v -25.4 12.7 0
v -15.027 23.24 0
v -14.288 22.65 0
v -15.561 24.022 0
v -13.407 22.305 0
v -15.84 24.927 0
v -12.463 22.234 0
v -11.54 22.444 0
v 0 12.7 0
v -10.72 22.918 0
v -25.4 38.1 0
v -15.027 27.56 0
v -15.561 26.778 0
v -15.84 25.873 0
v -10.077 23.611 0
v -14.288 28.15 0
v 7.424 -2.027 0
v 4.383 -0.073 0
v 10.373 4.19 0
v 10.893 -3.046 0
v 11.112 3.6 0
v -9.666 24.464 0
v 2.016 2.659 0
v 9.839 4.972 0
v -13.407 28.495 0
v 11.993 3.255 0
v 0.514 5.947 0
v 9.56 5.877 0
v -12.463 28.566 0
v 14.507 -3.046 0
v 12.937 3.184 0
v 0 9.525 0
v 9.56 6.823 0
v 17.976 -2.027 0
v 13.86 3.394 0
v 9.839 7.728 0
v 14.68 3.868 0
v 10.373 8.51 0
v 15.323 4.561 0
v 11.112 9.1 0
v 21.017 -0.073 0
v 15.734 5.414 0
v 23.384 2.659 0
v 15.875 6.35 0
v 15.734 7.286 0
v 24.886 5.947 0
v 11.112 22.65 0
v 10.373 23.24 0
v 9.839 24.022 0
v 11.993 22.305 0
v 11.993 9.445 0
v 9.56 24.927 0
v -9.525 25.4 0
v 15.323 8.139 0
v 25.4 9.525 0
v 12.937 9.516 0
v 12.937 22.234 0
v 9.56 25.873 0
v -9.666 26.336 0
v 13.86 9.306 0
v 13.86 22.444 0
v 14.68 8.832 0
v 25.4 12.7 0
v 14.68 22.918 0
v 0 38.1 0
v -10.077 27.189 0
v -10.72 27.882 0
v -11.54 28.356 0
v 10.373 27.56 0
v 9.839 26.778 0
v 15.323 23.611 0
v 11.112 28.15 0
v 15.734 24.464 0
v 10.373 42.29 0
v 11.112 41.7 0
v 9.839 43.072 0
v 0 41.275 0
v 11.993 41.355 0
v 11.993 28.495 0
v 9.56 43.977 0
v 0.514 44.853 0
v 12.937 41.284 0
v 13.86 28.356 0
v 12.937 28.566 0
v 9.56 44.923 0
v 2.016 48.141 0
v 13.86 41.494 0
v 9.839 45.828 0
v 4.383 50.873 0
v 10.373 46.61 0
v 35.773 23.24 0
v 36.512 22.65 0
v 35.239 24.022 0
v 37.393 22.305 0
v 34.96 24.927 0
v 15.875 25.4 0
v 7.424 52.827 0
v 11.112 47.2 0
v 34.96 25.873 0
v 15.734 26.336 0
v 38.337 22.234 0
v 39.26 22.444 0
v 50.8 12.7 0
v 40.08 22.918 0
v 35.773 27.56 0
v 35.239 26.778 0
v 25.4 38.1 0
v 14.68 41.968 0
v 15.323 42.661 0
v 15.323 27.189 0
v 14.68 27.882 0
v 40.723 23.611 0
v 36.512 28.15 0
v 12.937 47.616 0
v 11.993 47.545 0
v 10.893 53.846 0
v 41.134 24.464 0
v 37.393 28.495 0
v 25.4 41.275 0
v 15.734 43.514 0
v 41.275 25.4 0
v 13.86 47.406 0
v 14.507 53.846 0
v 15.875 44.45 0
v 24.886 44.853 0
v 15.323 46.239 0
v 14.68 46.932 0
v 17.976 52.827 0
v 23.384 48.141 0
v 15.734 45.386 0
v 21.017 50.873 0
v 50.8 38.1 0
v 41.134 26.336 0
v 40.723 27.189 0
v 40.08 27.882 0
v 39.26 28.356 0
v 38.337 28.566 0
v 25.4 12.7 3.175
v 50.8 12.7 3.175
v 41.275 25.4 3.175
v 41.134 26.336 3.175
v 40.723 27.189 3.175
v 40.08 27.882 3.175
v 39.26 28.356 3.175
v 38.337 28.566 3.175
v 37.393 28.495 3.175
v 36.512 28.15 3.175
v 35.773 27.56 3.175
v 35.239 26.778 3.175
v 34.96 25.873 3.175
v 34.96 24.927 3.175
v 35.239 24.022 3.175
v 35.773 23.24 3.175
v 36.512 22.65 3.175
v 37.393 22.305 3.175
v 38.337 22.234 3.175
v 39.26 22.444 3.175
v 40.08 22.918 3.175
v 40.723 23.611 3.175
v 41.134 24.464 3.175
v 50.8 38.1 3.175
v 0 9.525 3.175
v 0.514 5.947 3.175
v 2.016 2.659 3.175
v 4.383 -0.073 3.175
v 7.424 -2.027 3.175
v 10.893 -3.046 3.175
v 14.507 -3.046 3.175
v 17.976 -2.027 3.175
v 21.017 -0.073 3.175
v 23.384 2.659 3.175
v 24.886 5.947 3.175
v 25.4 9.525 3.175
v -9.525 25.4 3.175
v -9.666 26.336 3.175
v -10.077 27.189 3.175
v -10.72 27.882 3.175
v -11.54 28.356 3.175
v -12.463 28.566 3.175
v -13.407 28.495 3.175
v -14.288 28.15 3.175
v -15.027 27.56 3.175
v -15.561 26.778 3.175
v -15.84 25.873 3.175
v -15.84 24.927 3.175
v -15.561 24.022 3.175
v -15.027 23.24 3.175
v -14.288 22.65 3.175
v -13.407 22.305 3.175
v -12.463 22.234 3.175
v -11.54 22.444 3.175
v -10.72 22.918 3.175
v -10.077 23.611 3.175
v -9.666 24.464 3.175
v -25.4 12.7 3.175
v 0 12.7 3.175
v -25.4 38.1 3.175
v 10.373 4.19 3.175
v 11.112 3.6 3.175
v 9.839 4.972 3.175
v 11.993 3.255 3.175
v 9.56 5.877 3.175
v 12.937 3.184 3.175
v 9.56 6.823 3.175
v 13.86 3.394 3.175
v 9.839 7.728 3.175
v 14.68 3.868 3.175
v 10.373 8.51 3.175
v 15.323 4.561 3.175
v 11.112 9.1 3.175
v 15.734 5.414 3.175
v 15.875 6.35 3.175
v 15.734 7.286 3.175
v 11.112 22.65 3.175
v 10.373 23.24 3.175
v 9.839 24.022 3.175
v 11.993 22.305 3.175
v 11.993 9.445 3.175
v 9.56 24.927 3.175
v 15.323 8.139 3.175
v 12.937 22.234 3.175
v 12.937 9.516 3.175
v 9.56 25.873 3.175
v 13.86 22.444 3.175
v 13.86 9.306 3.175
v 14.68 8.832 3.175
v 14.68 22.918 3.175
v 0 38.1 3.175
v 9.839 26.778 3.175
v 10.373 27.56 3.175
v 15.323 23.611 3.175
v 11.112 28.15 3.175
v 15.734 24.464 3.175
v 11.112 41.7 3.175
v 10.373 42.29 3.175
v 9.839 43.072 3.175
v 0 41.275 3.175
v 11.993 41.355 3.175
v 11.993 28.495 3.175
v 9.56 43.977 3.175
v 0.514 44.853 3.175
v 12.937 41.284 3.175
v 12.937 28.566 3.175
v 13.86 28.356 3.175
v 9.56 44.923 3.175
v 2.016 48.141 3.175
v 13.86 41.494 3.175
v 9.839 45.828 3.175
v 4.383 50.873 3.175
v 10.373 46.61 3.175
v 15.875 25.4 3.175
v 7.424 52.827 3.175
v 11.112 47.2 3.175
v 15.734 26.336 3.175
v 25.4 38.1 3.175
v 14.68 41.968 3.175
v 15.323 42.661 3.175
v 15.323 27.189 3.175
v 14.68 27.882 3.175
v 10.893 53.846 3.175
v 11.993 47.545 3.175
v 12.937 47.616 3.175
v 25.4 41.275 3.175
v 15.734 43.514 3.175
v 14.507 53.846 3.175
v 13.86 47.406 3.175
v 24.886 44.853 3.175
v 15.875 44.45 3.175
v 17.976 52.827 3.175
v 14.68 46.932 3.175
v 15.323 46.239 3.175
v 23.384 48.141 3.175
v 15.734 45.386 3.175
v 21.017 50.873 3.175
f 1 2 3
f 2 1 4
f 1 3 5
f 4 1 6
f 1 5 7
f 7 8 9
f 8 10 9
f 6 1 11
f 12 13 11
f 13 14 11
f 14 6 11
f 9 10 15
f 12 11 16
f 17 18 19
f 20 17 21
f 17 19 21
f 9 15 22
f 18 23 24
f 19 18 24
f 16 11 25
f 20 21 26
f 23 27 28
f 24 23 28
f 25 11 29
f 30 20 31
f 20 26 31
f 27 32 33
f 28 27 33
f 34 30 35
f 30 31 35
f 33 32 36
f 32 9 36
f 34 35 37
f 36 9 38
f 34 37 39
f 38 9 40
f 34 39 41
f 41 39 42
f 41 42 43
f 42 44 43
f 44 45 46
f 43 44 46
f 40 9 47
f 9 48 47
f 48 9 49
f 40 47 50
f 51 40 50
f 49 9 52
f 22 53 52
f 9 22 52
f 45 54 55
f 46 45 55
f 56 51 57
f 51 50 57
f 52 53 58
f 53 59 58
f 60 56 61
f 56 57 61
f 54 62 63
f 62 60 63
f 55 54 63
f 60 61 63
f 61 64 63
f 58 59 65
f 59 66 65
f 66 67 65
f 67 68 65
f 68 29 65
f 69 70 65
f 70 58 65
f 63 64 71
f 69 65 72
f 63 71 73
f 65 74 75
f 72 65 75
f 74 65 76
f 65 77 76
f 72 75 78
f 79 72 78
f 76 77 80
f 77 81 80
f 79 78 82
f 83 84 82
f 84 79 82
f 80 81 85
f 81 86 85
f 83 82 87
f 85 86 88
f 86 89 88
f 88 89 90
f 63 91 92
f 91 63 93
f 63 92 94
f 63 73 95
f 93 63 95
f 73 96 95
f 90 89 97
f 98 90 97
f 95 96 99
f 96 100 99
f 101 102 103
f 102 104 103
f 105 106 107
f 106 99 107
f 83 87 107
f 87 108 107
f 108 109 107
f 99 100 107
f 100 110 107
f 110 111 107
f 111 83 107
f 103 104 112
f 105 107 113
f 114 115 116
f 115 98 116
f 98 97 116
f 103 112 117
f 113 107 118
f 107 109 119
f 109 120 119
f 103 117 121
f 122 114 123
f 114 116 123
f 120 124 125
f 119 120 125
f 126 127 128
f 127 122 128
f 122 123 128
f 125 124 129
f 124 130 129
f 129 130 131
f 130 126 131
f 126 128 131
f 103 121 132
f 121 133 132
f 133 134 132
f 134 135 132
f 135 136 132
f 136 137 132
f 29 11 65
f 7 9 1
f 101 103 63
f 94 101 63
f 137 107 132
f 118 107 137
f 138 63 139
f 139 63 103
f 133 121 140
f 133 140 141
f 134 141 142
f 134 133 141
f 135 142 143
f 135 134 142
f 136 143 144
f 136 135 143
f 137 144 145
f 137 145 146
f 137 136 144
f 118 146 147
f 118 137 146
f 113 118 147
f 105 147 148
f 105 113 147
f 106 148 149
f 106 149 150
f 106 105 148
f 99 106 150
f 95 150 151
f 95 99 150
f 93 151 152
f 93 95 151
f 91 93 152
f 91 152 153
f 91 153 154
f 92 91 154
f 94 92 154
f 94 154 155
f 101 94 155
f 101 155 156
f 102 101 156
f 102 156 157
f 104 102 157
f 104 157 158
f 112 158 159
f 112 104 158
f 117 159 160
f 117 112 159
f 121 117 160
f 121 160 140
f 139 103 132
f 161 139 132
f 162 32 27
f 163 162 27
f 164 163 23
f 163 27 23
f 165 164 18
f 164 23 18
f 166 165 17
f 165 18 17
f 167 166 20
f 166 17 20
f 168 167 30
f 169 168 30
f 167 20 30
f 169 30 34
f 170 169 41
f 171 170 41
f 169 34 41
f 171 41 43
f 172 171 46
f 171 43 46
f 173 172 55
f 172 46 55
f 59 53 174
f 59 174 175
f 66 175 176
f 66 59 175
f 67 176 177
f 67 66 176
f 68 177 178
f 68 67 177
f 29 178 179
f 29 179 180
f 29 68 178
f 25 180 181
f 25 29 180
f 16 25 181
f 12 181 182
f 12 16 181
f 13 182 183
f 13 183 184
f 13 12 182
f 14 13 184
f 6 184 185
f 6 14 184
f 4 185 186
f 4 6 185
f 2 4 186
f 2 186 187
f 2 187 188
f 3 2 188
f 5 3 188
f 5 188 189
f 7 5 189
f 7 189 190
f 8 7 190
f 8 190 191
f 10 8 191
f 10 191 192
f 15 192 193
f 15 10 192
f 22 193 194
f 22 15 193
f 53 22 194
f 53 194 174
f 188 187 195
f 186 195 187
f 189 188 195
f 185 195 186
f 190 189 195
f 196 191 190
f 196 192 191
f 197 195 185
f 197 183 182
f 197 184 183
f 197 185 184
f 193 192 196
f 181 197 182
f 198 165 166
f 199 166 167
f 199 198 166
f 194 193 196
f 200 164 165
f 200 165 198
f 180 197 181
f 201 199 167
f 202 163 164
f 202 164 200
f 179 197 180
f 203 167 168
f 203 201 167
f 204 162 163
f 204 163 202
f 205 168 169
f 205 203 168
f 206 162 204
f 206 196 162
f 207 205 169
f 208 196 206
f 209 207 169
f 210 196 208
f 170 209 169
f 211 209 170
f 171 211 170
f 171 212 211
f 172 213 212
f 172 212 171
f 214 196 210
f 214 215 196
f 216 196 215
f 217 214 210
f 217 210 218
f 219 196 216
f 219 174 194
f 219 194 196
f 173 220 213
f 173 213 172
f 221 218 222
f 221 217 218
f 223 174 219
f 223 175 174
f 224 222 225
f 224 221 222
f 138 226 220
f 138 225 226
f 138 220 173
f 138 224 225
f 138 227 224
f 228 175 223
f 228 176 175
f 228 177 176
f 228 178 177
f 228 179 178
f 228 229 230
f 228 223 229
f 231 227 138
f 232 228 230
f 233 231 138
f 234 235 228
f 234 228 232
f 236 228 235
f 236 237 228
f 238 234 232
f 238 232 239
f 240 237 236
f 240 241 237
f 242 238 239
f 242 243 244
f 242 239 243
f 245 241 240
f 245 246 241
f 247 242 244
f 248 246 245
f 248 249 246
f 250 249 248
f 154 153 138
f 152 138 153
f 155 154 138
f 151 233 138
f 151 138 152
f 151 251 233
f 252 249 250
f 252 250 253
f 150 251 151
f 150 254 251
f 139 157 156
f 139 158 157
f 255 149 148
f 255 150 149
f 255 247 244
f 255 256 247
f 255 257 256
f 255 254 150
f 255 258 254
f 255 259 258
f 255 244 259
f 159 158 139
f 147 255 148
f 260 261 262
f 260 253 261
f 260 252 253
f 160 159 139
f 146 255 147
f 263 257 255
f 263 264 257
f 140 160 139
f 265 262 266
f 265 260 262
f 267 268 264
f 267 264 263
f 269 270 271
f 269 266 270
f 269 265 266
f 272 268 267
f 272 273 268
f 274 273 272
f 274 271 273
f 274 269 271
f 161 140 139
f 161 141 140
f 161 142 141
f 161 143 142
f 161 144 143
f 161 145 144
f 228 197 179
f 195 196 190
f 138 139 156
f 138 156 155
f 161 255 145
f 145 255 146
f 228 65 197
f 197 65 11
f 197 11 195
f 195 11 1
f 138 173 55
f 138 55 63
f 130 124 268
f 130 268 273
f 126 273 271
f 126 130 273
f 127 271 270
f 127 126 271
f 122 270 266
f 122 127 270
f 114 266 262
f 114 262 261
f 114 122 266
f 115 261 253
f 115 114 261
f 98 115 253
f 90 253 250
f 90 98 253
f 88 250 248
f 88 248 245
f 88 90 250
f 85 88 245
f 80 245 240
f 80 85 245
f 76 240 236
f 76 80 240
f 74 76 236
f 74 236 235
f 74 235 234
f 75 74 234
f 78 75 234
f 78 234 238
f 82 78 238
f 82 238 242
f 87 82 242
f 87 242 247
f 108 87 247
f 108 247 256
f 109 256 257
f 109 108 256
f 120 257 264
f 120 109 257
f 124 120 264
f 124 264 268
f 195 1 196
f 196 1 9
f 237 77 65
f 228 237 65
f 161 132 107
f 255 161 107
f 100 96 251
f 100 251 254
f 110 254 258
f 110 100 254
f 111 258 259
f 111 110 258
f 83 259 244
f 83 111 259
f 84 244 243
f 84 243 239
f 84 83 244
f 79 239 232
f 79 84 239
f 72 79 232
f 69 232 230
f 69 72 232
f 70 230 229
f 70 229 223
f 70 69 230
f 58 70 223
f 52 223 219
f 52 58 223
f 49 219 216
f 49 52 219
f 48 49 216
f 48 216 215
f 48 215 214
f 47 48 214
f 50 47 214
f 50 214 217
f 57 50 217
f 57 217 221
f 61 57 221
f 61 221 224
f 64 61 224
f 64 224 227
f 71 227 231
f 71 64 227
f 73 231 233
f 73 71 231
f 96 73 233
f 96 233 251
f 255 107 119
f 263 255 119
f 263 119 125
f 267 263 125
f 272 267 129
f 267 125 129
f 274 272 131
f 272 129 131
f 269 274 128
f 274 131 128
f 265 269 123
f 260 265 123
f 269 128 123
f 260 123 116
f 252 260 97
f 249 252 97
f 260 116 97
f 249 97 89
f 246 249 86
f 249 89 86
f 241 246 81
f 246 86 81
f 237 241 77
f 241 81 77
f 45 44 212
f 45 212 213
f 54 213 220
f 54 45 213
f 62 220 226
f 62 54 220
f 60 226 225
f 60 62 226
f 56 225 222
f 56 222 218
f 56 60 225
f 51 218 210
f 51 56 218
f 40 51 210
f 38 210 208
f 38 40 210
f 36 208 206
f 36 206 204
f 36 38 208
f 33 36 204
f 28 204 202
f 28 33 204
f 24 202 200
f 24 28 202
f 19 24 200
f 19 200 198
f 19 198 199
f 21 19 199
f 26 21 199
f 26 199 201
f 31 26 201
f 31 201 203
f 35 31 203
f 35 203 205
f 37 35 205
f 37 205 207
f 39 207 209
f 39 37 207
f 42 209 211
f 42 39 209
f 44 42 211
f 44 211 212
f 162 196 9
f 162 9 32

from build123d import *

# Parameters (mm, degrees)
SKETCH1_R           = 3.175
BOSS_EXTRUDE1_DEPTH = 3.175


with BuildPart() as part:
    # Sketch1 → Boss-Extrude1 (new body)
    with BuildSketch(Plane.XY):
        with BuildLine():
            Line((0, 38.1), (-25.4, 38.1))
            Line((-25.4, 38.1), (-25.4, 12.7))
            Line((-25.4, 12.7), (0, 12.7))
            Line((0, 12.7), (0, 9.525))
            ThreePointArc((0, 9.525), (12.7, -3.175), (25.4, 9.525))
            Line((25.4, 9.525), (25.4, 12.7))
            Line((25.4, 12.7), (50.8, 12.7))
            Line((50.8, 12.7), (50.8, 38.1))
            Line((50.8, 38.1), (25.4, 38.1))
            Line((25.4, 38.1), (25.4, 41.275))
            ThreePointArc((25.4, 41.275), (12.7, 53.975), (0, 41.275))
            Line((0, 41.275), (0, 38.1))
        make_face()
        with Locations((12.7, 44.45)):
            Circle(SKETCH1_R, mode=Mode.SUBTRACT)
        with Locations((12.7, 6.35)):
            Circle(SKETCH1_R, mode=Mode.SUBTRACT)
        with Locations((12.7, 25.4)):
            Circle(SKETCH1_R, mode=Mode.SUBTRACT)
        with Locations((38.1, 25.4)):
            Circle(SKETCH1_R, mode=Mode.SUBTRACT)
        with Locations((-12.7, 25.4)):
            Circle(SKETCH1_R, mode=Mode.SUBTRACT)
    extrude(amount=BOSS_EXTRUDE1_DEPTH)


solid = part.part
